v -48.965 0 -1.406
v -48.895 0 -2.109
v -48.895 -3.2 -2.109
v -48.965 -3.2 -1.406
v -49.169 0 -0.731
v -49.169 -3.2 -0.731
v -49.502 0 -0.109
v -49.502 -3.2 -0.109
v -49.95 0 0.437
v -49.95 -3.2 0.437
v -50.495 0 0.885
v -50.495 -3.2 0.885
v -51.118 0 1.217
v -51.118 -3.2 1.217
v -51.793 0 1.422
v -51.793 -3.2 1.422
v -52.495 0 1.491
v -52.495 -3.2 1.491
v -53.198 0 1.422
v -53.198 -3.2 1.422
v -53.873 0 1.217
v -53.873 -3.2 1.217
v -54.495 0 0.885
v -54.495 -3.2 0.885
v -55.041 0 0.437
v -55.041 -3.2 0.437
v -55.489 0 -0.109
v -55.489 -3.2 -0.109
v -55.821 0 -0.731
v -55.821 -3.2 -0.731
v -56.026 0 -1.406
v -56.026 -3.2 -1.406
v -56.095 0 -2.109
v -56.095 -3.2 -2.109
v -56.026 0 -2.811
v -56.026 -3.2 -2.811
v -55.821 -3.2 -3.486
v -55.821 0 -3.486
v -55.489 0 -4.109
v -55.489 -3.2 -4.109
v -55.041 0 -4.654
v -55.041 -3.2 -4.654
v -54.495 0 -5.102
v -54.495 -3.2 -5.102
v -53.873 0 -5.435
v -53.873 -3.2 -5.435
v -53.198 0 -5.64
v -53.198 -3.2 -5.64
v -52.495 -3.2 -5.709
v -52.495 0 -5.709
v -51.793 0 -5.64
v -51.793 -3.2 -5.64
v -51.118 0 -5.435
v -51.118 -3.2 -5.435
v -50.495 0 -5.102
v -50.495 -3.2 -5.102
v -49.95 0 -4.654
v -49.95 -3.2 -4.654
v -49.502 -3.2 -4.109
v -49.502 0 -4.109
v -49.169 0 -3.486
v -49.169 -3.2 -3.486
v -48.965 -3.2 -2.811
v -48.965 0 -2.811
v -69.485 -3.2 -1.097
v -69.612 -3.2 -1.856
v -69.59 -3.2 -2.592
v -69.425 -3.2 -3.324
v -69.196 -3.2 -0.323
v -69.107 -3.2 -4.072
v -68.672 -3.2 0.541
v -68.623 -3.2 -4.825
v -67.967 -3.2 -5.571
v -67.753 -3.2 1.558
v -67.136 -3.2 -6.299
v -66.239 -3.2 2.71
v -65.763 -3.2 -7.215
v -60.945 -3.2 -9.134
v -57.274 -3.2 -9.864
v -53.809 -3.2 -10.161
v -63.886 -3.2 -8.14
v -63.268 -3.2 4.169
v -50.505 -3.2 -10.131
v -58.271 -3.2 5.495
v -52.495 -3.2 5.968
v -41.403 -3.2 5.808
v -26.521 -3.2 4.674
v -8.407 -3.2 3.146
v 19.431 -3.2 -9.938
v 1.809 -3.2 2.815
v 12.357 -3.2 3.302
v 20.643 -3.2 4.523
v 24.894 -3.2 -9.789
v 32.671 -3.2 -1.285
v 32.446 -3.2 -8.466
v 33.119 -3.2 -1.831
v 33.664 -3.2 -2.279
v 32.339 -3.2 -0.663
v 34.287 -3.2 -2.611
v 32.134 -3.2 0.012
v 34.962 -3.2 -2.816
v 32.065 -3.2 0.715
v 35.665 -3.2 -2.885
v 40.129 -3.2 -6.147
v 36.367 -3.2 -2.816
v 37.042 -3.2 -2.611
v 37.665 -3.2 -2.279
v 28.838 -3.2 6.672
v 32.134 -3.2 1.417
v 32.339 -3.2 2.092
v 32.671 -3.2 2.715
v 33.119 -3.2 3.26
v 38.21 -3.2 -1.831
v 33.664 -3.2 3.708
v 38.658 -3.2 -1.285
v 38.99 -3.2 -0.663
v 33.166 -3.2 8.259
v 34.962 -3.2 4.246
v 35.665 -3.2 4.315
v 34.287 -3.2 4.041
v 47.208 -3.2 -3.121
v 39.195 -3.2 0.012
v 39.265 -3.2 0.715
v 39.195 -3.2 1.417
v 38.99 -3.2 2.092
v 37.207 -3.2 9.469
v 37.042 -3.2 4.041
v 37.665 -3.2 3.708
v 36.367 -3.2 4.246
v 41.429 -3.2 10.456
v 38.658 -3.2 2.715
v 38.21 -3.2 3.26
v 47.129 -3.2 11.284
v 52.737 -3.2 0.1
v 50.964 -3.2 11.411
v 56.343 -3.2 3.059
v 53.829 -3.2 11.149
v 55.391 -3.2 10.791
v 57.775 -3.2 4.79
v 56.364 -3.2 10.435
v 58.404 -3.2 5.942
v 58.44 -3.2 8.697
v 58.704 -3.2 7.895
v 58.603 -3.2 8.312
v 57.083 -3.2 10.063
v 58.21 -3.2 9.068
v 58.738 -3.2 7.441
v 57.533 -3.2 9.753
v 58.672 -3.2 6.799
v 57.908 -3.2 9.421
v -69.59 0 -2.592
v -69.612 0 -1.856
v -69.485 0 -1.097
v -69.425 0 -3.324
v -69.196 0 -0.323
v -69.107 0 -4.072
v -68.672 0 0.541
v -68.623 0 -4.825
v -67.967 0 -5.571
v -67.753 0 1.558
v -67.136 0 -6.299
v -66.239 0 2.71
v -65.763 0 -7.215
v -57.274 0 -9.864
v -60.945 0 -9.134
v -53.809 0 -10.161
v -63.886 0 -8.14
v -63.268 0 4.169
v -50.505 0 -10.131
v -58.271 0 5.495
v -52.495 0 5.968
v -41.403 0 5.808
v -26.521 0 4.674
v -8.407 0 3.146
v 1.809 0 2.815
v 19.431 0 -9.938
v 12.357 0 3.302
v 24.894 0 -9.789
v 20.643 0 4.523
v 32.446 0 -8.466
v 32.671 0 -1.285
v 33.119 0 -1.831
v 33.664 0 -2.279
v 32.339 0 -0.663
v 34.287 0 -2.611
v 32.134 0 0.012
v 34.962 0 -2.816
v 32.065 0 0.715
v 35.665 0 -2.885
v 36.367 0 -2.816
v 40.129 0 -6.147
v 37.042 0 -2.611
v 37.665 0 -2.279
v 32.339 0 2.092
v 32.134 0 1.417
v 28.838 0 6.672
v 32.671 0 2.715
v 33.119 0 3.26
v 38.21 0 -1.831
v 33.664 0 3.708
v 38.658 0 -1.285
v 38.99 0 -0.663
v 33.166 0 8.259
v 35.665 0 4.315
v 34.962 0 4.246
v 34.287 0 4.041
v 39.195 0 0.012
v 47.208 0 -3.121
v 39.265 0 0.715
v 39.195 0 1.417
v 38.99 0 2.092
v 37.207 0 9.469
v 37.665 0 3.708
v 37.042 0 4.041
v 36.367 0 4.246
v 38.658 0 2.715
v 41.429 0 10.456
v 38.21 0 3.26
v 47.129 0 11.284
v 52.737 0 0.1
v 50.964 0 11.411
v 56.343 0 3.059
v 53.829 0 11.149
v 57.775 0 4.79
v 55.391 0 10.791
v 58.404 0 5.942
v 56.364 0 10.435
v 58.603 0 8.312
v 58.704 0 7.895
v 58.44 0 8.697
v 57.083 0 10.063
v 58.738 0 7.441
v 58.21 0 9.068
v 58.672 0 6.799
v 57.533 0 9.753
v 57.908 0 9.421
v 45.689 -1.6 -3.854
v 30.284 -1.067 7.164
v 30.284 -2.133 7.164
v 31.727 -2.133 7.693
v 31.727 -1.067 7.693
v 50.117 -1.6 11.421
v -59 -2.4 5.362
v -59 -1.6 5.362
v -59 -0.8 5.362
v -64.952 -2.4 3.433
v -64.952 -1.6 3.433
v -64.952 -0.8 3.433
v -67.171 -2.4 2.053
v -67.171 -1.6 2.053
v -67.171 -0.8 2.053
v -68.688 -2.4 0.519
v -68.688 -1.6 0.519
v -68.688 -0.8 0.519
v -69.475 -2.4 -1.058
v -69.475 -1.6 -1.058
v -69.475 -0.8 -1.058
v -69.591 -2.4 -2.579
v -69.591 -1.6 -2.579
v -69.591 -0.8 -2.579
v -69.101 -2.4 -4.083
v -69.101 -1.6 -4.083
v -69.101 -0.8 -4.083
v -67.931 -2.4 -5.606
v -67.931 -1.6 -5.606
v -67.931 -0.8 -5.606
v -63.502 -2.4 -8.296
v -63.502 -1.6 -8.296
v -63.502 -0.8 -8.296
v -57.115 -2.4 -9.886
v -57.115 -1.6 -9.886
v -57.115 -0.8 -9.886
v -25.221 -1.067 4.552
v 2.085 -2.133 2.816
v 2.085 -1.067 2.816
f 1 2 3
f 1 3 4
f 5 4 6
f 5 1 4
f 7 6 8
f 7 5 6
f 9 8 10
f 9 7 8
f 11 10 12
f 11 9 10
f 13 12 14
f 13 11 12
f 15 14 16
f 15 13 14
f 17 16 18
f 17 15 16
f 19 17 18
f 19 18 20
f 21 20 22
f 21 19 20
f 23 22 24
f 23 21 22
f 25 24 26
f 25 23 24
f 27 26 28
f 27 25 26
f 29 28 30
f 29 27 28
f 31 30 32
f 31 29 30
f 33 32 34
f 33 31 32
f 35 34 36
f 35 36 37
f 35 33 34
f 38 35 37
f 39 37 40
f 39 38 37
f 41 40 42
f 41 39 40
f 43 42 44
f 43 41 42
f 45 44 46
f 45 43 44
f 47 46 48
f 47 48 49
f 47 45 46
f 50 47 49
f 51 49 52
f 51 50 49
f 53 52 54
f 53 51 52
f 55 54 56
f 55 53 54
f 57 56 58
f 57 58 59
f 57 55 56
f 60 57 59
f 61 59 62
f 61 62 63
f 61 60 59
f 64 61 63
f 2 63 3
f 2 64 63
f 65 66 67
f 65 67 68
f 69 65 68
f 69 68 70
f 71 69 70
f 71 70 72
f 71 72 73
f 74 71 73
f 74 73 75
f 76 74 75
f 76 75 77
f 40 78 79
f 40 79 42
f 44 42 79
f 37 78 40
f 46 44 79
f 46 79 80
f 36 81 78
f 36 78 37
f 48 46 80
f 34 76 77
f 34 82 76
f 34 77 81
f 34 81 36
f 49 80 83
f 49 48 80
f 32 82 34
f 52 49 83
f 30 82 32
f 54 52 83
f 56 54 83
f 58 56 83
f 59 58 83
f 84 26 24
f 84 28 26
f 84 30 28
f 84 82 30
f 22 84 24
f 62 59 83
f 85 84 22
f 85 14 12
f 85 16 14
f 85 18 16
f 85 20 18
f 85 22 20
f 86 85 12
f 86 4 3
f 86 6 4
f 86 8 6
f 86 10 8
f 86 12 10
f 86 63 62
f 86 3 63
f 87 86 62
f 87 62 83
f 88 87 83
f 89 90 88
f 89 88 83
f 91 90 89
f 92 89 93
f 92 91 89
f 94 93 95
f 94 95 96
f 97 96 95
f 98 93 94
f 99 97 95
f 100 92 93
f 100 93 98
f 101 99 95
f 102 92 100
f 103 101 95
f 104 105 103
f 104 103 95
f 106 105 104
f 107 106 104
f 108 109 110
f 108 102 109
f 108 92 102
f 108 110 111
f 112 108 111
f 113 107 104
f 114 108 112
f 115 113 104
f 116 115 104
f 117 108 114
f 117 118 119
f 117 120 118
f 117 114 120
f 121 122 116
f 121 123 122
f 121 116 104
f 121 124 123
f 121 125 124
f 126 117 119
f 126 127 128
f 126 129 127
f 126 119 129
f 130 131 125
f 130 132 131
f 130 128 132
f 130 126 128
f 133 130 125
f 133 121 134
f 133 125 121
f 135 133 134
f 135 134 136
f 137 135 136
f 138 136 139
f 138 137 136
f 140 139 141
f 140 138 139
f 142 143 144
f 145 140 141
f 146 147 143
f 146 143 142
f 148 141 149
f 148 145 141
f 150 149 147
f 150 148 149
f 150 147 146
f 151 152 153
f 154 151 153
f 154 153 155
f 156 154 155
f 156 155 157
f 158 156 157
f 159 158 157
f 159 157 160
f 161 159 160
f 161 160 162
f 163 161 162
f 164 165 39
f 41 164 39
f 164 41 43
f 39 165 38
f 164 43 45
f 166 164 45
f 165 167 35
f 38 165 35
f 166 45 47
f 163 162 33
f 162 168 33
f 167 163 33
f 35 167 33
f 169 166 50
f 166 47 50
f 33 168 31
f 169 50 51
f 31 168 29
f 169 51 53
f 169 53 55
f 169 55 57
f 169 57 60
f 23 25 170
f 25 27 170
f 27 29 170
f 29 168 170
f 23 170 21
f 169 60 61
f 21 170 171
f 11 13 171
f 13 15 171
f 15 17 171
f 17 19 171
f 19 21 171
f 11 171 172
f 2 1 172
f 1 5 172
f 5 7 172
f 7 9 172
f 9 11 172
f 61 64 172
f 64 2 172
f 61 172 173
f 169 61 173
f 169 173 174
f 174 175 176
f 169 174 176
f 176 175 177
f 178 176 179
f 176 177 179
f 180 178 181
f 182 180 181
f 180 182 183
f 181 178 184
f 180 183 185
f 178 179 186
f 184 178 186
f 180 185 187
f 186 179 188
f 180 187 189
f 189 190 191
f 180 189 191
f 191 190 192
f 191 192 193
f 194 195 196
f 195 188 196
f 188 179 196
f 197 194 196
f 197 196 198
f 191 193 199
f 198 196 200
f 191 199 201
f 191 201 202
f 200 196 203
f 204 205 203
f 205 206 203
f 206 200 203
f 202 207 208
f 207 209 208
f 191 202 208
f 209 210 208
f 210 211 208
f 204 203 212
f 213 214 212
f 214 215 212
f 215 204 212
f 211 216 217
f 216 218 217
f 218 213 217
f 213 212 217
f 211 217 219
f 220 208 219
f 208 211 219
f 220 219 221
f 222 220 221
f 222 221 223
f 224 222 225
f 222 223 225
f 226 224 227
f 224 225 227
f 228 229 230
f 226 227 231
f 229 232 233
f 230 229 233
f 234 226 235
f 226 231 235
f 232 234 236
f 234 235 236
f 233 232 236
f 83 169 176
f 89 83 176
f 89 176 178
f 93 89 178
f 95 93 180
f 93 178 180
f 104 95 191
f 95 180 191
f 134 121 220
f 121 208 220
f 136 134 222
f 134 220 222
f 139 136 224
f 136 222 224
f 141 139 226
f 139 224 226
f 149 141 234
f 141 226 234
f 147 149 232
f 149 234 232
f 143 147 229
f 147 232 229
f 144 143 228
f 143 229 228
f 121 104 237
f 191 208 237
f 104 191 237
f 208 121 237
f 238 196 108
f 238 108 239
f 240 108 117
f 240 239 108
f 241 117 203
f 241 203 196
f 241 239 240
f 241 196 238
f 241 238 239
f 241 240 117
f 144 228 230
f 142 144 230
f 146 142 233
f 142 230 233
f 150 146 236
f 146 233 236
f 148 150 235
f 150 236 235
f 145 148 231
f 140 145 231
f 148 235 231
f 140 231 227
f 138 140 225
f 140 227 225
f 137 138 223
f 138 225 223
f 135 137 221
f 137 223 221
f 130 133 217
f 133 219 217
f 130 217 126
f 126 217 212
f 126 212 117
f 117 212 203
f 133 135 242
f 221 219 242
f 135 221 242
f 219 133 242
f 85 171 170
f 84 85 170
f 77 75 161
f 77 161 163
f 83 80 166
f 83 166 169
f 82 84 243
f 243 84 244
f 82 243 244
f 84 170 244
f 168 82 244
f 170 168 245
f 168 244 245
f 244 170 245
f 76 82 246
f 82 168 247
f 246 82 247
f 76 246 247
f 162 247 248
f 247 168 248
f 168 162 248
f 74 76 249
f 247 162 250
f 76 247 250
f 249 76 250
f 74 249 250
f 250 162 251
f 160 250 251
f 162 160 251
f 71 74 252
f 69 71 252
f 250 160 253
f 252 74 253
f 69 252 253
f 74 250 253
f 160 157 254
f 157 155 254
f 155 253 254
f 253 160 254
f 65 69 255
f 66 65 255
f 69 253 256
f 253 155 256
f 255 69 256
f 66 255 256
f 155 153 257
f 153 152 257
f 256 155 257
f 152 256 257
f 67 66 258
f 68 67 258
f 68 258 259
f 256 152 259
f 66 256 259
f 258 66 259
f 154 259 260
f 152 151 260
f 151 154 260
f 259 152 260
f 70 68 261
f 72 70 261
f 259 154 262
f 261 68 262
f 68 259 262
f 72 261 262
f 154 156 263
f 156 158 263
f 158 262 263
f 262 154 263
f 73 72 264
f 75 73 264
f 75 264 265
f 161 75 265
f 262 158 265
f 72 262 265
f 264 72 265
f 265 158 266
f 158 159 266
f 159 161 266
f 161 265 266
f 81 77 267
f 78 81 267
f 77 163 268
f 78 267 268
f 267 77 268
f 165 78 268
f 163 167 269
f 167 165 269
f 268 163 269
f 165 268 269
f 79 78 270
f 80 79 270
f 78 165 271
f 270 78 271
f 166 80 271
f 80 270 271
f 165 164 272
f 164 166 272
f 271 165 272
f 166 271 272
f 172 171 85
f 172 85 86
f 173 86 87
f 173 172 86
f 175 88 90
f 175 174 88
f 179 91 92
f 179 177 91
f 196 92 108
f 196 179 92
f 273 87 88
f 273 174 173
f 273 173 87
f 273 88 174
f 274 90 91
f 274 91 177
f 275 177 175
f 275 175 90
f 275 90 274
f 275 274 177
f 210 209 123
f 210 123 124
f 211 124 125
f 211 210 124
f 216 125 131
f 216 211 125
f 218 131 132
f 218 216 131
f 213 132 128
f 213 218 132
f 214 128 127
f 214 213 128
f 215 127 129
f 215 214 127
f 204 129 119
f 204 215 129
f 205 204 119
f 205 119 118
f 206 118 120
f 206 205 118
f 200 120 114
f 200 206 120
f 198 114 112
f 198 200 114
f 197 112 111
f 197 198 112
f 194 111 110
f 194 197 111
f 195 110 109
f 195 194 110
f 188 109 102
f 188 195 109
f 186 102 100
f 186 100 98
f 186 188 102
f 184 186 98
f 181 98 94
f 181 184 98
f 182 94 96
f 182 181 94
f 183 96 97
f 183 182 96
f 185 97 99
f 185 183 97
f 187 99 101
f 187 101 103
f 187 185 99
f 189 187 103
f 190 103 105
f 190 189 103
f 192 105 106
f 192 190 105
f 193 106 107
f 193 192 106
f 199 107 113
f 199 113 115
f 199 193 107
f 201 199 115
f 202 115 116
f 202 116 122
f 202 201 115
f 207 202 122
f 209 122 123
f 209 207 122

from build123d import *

# Parameters (mm, degrees)
F0_R     = 3.6
F1_DEPTH = 3.2


with BuildPart() as f1:
    # F0 (on Front) → F1 (new body)
    with BuildSketch(Plane.XZ):
        with BuildLine():
            Line((-50.505031, -10.130523), (19.430825, -9.938481))
            add(Edge.make_bspline(
                [(28.838257, 6.671619), (-7.901181, -8.15772), (19.430825, -9.938481)],
                knots=[1.762633, 1.762633, 1.762633, 3.823497, 3.823497, 3.823497], degree=2, weights=[1, 0.514448, 1]))
            add(Edge.make_bspline(
                [(-52.495337, 5.967676), (-25.432996, 6.684797), (2.557579, -1.952245), (28.838257, 6.671619)],
                knots=[0, 0, 0, 0, 81.21735, 81.21735, 81.21735, 81.21735], degree=3))
            add(Edge.make_bspline(
                [(-35.370454, -2.10879), (-35.370454, 5.967676), (-52.495337, 5.967676)],
                knots=[0, 0, 0, 1.570796, 1.570796, 1.570796], degree=2, weights=[1, 0.707107, 1]))
            add(Edge.make_bspline(
                [(-50.505031, -10.130523), (-35.370454, -9.295286), (-35.370454, -2.10879)],
                knots=[4.828875, 4.828875, 4.828875, 6.283185, 6.283185, 6.283185], degree=2, weights=[1, 0.747069, 1]))
        make_face()
        with BuildLine():
            add(Edge.make_bspline(
                [(-52.495337, 5.967676), (-70.647845, 5.967676), (-69.591183, -2.578923), (-68.534521, -11.125522), (-50.505031, -10.130523)],
                knots=[1.570796, 1.570796, 1.570796, 3.199836, 3.199836, 4.828875, 4.828875, 4.828875], degree=2, weights=[1, 0.686218, 1, 0.686218, 1]))
            add(Edge.make_bspline(
                [(-50.505031, -10.130523), (-35.370454, -9.295286), (-35.370454, -2.10879)],
                knots=[4.828875, 4.828875, 4.828875, 6.283185, 6.283185, 6.283185], degree=2, weights=[1, 0.747069, 1]))
            add(Edge.make_bspline(
                [(-35.370454, -2.10879), (-35.370454, 5.967676), (-52.495337, 5.967676)],
                knots=[0, 0, 0, 1.570796, 1.570796, 1.570796], degree=2, weights=[1, 0.707107, 1]))
        make_face()
        with Locations((-52.495337, -2.10879)):
            Circle(F0_R, mode=Mode.SUBTRACT)
        with BuildLine():
            add(Edge.make_bspline(
                [(19.430825, -9.938481), (65.644886, -12.949463), (58.602594, 8.312259)],
                knots=[3.823497, 3.823497, 3.823497, 6.283185, 6.283185, 6.283185], degree=2, weights=[1, 0.334385, 1]))
            add(Edge.make_bspline(
                [(58.602594, 8.312259), (56.103929, 15.856102), (33.165845, 8.258567)],
                knots=[0, 0, 0, 1.570796, 1.570796, 1.570796], degree=2, weights=[1, 0.707107, 1]))
            add(Edge.make_bspline(
                [(28.838257, 6.671619), (30.286123, 7.146728), (31.728799, 7.674227), (33.165845, 8.258567)],
                knots=[81.21735, 81.21735, 81.21735, 81.21735, 85.69181, 85.69181, 85.69181, 85.69181], degree=3))
            add(Edge.make_bspline(
                [(28.838257, 6.671619), (-7.901181, -8.15772), (19.430825, -9.938481)],
                knots=[1.762633, 1.762633, 1.762633, 3.823497, 3.823497, 3.823497], degree=2, weights=[1, 0.514448, 1]))
        make_face()
        with Locations((35.664511, 0.714724)):
            Circle(F0_R, mode=Mode.SUBTRACT)
    extrude(amount=F1_DEPTH)


solid = f1.part
